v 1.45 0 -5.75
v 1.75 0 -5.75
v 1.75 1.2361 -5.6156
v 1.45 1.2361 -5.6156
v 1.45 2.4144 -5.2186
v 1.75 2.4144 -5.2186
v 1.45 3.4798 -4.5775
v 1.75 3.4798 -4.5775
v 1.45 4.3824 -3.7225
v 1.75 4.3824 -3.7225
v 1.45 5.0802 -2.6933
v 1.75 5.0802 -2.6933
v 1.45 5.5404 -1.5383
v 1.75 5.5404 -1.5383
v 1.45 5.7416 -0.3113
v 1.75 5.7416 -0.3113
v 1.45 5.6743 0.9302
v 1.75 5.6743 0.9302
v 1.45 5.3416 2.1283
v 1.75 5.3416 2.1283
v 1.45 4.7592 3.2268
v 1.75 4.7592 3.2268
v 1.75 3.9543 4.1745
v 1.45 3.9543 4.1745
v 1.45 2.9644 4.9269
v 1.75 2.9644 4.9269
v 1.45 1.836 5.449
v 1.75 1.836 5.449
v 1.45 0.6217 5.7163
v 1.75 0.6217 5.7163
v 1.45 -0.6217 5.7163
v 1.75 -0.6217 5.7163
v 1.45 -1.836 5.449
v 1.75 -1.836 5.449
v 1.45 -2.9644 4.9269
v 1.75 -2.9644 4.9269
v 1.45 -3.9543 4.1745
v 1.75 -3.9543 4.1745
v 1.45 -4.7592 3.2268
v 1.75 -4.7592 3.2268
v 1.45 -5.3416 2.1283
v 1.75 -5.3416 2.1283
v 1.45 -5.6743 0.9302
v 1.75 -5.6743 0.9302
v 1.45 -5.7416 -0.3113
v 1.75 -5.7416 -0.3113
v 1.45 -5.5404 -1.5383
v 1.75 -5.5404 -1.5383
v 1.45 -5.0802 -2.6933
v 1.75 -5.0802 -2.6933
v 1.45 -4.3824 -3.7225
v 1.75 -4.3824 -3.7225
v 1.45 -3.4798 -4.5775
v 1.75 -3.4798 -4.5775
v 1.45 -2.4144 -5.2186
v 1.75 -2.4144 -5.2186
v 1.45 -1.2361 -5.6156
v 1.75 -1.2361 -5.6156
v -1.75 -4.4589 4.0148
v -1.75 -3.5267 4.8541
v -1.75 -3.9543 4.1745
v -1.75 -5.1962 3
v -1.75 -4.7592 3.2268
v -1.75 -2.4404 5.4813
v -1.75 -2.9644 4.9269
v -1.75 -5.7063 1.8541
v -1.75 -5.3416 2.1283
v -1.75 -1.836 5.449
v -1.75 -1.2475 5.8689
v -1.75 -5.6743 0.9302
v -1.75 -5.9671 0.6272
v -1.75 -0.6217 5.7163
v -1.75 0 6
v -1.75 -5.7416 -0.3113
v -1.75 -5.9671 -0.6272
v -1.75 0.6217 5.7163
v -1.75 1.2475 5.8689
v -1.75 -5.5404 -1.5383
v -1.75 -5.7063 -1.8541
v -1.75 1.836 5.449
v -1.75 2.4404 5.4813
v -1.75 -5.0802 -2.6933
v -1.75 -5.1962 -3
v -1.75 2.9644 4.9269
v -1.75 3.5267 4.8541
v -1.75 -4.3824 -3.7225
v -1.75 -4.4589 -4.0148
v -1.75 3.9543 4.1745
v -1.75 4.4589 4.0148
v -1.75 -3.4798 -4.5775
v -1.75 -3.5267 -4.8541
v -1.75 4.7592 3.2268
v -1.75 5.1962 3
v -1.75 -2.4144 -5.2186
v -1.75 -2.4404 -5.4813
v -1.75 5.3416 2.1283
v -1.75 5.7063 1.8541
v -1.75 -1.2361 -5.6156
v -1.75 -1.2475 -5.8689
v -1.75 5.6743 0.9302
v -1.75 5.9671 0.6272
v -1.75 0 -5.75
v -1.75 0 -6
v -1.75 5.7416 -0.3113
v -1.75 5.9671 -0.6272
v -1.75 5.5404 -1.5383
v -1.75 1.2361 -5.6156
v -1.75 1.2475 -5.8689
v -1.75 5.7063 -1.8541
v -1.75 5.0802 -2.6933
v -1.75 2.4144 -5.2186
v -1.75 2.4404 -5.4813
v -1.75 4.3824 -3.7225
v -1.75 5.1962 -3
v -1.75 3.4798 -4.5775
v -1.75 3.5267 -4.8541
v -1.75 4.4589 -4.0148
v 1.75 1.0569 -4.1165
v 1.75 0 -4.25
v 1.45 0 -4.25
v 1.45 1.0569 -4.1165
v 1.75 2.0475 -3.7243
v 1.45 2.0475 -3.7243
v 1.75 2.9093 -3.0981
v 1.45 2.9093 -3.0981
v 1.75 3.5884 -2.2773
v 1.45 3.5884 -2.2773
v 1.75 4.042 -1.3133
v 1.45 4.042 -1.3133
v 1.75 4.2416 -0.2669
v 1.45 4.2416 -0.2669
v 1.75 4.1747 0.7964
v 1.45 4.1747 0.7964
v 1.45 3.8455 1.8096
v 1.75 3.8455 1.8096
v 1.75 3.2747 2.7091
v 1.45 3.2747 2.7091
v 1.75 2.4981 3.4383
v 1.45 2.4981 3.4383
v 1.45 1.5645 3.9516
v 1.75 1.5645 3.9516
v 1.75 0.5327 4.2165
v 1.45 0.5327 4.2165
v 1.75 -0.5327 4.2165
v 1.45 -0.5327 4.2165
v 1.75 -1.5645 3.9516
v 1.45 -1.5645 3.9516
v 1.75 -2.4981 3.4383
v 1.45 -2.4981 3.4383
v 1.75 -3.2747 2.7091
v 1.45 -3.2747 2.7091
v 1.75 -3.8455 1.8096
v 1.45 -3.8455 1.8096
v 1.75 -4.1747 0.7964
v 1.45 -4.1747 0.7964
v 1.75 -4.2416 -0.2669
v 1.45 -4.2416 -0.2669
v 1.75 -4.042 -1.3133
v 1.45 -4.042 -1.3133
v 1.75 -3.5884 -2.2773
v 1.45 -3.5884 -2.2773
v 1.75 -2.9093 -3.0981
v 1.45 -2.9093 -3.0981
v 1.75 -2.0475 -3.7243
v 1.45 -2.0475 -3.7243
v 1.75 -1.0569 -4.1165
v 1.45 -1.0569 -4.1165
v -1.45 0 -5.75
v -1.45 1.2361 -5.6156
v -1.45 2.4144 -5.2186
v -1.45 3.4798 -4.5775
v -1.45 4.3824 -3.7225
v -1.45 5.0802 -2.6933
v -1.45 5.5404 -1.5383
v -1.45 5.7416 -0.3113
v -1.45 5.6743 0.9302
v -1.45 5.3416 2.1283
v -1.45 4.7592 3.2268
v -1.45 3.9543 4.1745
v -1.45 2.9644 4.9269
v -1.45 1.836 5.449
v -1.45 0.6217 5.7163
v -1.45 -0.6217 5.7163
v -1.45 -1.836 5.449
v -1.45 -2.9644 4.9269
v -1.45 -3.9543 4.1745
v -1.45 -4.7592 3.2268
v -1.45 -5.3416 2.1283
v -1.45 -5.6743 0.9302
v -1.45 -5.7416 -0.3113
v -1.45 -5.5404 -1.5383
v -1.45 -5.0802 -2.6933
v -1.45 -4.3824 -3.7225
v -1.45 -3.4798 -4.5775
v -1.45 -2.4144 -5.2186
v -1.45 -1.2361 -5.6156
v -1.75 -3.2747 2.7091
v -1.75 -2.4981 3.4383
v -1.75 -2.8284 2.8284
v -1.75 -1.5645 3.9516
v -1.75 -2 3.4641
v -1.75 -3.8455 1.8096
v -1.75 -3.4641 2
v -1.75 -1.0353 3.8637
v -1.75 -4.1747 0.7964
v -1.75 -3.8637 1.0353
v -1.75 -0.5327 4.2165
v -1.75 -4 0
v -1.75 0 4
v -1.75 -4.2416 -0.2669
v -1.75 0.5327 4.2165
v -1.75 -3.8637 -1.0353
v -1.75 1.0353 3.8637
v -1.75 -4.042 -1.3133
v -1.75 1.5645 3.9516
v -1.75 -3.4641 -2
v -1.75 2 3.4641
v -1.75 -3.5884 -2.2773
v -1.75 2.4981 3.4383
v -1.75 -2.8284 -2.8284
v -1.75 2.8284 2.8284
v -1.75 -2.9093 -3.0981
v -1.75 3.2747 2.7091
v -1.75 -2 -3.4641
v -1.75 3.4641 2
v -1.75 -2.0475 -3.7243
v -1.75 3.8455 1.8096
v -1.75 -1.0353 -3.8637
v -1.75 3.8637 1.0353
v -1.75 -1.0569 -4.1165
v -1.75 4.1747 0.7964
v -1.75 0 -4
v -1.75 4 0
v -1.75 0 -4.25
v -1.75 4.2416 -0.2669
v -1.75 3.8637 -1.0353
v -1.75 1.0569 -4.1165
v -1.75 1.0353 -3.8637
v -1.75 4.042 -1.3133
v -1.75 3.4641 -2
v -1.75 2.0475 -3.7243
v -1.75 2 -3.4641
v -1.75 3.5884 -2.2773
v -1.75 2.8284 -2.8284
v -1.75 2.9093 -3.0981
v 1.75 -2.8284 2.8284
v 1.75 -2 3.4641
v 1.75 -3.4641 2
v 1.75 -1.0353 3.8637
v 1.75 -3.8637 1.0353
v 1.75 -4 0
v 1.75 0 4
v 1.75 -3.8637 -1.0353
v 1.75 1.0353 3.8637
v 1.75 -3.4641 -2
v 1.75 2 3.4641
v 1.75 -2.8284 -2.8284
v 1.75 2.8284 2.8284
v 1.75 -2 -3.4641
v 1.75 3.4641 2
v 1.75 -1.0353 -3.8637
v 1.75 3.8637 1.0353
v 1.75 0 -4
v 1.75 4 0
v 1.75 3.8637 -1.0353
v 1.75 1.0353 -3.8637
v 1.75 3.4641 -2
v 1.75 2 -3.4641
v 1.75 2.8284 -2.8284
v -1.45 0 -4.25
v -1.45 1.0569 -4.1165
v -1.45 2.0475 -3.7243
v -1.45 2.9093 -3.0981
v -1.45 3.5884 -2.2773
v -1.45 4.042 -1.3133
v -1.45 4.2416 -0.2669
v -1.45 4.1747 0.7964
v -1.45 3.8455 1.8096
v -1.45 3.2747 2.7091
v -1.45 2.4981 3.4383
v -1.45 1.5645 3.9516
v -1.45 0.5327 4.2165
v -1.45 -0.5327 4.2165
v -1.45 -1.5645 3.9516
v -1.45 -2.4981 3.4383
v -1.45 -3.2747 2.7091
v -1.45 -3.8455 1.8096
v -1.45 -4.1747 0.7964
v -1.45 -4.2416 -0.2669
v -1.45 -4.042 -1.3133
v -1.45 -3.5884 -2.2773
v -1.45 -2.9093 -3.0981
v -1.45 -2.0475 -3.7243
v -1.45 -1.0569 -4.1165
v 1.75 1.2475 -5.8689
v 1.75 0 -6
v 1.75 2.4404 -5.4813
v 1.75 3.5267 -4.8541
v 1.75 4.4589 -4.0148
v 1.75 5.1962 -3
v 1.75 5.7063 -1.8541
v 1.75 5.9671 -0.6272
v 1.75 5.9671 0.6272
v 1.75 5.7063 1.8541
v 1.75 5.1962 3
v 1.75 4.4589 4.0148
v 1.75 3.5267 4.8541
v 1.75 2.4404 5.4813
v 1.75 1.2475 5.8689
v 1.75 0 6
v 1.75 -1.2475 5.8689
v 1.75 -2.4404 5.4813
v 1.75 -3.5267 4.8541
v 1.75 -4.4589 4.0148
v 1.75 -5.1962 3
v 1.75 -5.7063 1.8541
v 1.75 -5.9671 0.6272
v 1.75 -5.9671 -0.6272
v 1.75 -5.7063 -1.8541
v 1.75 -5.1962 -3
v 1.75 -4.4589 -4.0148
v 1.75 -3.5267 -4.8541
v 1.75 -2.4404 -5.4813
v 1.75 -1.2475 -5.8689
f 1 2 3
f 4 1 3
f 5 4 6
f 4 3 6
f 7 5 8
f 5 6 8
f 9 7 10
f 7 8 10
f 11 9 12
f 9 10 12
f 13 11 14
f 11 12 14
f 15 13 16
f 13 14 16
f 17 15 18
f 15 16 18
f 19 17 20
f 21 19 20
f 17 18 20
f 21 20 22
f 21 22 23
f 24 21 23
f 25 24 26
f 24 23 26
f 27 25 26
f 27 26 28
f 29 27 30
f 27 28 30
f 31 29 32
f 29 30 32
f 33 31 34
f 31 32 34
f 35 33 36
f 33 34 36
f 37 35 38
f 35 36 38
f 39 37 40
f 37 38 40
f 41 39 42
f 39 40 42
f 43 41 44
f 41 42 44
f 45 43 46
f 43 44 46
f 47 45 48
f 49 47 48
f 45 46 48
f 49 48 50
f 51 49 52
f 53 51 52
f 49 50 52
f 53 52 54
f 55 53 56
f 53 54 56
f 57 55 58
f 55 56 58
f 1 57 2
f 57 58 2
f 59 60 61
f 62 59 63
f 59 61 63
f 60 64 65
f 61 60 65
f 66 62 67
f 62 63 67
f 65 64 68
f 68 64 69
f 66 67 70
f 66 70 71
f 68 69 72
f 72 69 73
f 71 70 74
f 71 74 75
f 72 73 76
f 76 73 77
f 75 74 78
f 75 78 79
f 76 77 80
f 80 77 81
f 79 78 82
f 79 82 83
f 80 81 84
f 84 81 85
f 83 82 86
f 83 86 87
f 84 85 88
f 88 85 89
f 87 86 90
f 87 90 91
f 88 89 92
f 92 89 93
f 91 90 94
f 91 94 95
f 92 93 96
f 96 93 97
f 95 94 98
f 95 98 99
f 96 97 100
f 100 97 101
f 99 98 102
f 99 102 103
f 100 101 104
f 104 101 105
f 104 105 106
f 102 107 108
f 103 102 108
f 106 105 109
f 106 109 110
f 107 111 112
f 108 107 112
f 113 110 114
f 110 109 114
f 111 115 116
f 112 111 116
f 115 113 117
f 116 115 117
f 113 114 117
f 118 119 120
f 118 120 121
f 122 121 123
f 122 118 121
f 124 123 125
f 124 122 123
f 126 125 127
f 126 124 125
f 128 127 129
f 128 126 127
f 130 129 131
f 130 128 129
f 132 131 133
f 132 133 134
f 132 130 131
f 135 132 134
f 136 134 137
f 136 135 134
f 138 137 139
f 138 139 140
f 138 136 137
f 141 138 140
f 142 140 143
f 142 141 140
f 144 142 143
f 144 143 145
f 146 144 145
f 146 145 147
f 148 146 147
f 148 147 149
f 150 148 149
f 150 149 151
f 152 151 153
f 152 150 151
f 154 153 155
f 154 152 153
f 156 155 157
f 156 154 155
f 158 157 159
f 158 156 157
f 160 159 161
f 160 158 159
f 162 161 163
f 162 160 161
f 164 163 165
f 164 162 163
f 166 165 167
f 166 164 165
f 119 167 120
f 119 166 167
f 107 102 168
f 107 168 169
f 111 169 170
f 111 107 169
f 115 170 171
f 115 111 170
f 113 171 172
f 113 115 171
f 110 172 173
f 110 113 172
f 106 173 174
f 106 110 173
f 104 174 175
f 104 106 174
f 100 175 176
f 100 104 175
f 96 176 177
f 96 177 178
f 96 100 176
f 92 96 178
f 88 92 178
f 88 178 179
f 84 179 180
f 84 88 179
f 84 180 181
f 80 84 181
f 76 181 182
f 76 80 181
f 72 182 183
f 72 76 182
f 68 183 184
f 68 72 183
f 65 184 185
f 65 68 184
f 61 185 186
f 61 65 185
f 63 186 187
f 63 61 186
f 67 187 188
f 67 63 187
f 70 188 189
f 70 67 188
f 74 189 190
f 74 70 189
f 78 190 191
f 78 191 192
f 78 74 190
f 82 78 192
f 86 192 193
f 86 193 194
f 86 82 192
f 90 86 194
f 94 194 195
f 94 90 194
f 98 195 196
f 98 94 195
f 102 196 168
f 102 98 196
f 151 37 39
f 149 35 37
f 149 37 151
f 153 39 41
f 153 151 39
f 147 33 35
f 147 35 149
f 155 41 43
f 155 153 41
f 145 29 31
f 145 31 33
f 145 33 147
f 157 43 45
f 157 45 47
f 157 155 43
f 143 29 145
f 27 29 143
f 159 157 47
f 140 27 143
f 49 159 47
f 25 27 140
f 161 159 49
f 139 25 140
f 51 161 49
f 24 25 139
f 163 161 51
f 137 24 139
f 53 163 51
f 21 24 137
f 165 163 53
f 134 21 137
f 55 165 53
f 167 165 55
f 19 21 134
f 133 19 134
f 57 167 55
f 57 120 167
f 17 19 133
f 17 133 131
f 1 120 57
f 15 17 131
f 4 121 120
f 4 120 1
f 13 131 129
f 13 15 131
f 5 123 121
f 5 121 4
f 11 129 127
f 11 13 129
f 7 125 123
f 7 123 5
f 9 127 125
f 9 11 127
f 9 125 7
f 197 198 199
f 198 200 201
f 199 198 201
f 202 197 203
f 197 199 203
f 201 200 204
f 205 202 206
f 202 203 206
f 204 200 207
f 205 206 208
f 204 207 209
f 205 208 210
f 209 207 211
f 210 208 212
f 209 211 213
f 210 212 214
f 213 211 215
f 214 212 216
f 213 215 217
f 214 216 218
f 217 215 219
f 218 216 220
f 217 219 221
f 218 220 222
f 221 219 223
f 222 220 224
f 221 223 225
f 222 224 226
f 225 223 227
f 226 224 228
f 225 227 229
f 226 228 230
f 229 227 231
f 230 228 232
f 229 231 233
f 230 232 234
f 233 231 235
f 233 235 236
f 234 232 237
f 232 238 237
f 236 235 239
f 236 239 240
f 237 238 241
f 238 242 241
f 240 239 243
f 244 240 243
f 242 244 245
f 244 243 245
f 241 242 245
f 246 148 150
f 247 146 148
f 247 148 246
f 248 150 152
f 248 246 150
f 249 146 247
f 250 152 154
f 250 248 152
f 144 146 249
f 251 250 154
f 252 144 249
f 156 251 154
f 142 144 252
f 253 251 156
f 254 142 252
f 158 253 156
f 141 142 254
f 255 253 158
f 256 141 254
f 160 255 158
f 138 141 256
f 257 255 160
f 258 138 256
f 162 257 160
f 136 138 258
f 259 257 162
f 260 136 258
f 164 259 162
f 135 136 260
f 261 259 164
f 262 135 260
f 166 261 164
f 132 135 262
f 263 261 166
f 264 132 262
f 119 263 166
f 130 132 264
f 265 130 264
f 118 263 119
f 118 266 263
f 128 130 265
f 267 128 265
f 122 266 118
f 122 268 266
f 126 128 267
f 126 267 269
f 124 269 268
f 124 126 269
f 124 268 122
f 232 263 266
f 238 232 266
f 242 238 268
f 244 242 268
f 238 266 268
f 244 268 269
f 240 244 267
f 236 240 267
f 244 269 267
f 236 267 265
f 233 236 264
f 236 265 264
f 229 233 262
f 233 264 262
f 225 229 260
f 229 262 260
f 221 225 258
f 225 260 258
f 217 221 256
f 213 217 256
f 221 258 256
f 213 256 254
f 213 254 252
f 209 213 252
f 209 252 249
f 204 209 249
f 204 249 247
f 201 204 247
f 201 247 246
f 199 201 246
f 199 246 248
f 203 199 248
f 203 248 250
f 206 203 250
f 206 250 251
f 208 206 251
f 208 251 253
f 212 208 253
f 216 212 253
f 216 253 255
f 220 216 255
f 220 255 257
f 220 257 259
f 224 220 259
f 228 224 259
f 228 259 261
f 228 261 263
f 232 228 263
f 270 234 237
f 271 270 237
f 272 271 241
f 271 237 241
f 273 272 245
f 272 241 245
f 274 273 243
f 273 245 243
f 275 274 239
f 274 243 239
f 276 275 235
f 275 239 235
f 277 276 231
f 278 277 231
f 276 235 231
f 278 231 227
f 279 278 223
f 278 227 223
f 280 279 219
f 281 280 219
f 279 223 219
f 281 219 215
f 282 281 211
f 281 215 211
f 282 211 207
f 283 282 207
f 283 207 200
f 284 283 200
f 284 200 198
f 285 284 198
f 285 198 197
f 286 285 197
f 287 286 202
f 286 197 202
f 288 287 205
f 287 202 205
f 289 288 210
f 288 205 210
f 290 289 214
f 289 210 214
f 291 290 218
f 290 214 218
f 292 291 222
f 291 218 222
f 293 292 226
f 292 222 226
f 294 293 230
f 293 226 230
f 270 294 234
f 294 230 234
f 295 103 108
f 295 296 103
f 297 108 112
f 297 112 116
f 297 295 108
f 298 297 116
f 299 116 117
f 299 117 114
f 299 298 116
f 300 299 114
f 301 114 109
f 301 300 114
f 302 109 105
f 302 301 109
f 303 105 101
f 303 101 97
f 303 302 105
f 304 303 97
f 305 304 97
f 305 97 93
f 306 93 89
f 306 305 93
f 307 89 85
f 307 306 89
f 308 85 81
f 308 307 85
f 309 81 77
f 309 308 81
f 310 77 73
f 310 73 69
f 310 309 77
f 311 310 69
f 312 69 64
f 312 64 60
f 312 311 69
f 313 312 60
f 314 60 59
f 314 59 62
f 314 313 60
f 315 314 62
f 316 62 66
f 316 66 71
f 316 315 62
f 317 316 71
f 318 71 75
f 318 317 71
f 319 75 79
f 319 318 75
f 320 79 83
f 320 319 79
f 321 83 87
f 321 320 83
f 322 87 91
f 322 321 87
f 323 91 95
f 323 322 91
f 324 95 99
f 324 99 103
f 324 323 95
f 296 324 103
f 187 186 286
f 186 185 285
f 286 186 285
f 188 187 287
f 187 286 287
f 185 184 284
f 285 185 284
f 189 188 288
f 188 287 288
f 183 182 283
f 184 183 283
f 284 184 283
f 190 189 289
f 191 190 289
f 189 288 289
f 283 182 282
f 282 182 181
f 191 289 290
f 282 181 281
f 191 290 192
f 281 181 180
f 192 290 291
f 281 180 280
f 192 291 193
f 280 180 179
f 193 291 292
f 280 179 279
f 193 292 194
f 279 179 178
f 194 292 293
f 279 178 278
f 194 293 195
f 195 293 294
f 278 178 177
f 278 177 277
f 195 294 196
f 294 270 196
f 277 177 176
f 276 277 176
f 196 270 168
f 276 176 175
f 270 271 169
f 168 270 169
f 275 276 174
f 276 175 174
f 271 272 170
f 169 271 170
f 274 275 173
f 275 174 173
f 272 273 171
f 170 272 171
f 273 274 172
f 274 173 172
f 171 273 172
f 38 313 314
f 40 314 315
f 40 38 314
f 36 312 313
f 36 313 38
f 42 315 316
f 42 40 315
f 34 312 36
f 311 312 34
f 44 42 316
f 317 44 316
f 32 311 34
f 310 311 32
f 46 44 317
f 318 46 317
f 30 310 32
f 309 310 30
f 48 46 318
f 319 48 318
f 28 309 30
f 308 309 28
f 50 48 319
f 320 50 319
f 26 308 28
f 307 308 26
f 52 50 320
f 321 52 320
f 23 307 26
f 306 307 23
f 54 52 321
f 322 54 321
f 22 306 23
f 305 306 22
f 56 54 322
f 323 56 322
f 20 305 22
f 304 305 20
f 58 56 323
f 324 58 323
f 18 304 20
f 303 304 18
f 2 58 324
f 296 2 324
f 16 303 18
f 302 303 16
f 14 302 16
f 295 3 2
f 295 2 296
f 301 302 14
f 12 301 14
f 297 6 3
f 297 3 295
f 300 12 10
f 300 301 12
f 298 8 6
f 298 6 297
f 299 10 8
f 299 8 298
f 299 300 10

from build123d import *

# Parameters (mm, degrees)
SKETCH1_R           = 6
BOSS_EXTRUDE1_DEPTH = 1.75
CUT_EXTRUDE1_REACH  = 11.179
SKETCH2_R           = 4
SKETCH3_R           = 5.75
SKETCH3_R_2         = 4.25
CUT_EXTRUDE2_DEPTH  = 0.3


with BuildPart() as part:
    # Sketch1 → Boss-Extrude1 (new, symmetric)
    with BuildSketch(Plane(origin=(0, 0, 0), x_dir=(0, 0, -1), z_dir=(1, 0, 0))):
        Circle(SKETCH1_R)
    extrude(amount=BOSS_EXTRUDE1_DEPTH, both=True)

    # Sketch2 → Cut-Extrude1 (cut, up to next)
    with BuildSketch(Plane(origin=(1.75, 0, 0), x_dir=(0, 0, -1), z_dir=(1, 0, 0)), mode=Mode.PRIVATE) as cut_extrude1_sk1:
        Circle(SKETCH2_R)
    cut_extrude1_tool1 = extrude(cut_extrude1_sk1.sketch, amount=-CUT_EXTRUDE1_REACH, mode=Mode.PRIVATE) & part.part
    add(cut_extrude1_tool1.solids().sort_by_distance((1.75, 0, 0))[0], mode=Mode.SUBTRACT)

    # Sketch3 → Cut-Extrude2 (cut)
    with BuildSketch(Plane(origin=(1.75, 0, 0), x_dir=(0, 0, -1), z_dir=(1, 0, 0))):
        Circle(SKETCH3_R)
        Circle(SKETCH3_R_2, mode=Mode.SUBTRACT)
    cut_extrude2 = extrude(amount=-CUT_EXTRUDE2_DEPTH, mode=Mode.SUBTRACT)

    # Mirror1: Cut-Extrude2 across plane
    add(cut_extrude2.mirror(Plane(origin=(0, 0, 0), x_dir=(0, 0, 1), z_dir=(1, 0, 0))), mode=Mode.SUBTRACT)


solid = part.part
